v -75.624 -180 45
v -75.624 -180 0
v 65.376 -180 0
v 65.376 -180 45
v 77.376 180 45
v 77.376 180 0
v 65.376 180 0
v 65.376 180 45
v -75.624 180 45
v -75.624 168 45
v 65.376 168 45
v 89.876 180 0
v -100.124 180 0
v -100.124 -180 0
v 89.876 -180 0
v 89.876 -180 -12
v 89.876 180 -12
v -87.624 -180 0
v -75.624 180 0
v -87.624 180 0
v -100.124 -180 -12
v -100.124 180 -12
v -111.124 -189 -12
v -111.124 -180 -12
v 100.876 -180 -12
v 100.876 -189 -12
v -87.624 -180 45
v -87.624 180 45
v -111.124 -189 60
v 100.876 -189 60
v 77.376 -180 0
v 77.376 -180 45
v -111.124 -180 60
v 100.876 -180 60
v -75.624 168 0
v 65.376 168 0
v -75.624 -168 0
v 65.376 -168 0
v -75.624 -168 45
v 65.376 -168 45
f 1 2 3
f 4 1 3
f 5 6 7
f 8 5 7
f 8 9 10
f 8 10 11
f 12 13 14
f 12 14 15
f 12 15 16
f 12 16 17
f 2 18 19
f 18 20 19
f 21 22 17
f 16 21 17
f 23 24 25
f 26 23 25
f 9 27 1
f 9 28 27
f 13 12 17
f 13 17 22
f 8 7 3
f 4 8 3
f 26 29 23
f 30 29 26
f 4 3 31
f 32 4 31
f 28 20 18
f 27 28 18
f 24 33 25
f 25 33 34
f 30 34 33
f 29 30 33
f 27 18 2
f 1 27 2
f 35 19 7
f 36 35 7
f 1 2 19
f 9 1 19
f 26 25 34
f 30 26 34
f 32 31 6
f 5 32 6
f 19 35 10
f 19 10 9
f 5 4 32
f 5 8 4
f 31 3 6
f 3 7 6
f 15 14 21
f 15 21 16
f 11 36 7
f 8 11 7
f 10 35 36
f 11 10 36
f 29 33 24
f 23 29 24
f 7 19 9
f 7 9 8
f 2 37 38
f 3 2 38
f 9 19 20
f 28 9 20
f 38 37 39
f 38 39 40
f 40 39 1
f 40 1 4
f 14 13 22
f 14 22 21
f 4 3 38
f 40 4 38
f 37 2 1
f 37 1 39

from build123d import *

# Parameters (mm, degrees)
F1_DEPTH = 45
F0_W     = 141
F0_H     = 12
F2_DEPTH = 45
F4_DEPTH = 12
F6_DEPTH = 9


with BuildPart() as f1:
    # F0 (on Top) → F1 (new body)
    with BuildSketch(Plane.XY):
        Polygon((65.376237, -180), (77.376237, -180), (77.376237, 180), (65.376237, 180), (65.376237, 168), (65.376237, -168), align=None)
        Polygon((-87.623763, -180), (-75.623763, -180), (-75.623763, -168), (-75.623763, 168), (-75.623763, 180), (-87.623763, 180), align=None)
    extrude(amount=F1_DEPTH)


with BuildPart() as f2:
    # F0 (on Top) → F2 (new body)
    with BuildSketch(Plane.XY):
        with Locations((-5.123763, 174)):
            Rectangle(F0_W, F0_H)
        with Locations((-5.123763, -174)):
            Rectangle(F0_W, F0_H)
    extrude(amount=F2_DEPTH)


with BuildPart() as f4:
    # F3 (on face) → F4 (new body)
    with BuildSketch(Plane.XY):
        Polygon((-87.623763, -180), (77.376237, -180), (89.876237, -180), (89.876237, 180), (77.376237, 180), (-87.623763, 180), (-100.123763, 180), (-100.123763, -180), align=None)
    extrude(amount=-F4_DEPTH)


with BuildPart() as f6:
    # F5 (on face) → F6 (new body)
    with BuildSketch(Plane.XZ.offset(180)):
        Polygon((-100.123763, -12), (89.876237, -12), (100.876237, -12), (100.876237, 60), (-111.123763, 60), (-111.123763, -12), align=None)
    extrude(amount=F6_DEPTH)


solid = Compound([f1.part, f2.part, f4.part, f6.part])
